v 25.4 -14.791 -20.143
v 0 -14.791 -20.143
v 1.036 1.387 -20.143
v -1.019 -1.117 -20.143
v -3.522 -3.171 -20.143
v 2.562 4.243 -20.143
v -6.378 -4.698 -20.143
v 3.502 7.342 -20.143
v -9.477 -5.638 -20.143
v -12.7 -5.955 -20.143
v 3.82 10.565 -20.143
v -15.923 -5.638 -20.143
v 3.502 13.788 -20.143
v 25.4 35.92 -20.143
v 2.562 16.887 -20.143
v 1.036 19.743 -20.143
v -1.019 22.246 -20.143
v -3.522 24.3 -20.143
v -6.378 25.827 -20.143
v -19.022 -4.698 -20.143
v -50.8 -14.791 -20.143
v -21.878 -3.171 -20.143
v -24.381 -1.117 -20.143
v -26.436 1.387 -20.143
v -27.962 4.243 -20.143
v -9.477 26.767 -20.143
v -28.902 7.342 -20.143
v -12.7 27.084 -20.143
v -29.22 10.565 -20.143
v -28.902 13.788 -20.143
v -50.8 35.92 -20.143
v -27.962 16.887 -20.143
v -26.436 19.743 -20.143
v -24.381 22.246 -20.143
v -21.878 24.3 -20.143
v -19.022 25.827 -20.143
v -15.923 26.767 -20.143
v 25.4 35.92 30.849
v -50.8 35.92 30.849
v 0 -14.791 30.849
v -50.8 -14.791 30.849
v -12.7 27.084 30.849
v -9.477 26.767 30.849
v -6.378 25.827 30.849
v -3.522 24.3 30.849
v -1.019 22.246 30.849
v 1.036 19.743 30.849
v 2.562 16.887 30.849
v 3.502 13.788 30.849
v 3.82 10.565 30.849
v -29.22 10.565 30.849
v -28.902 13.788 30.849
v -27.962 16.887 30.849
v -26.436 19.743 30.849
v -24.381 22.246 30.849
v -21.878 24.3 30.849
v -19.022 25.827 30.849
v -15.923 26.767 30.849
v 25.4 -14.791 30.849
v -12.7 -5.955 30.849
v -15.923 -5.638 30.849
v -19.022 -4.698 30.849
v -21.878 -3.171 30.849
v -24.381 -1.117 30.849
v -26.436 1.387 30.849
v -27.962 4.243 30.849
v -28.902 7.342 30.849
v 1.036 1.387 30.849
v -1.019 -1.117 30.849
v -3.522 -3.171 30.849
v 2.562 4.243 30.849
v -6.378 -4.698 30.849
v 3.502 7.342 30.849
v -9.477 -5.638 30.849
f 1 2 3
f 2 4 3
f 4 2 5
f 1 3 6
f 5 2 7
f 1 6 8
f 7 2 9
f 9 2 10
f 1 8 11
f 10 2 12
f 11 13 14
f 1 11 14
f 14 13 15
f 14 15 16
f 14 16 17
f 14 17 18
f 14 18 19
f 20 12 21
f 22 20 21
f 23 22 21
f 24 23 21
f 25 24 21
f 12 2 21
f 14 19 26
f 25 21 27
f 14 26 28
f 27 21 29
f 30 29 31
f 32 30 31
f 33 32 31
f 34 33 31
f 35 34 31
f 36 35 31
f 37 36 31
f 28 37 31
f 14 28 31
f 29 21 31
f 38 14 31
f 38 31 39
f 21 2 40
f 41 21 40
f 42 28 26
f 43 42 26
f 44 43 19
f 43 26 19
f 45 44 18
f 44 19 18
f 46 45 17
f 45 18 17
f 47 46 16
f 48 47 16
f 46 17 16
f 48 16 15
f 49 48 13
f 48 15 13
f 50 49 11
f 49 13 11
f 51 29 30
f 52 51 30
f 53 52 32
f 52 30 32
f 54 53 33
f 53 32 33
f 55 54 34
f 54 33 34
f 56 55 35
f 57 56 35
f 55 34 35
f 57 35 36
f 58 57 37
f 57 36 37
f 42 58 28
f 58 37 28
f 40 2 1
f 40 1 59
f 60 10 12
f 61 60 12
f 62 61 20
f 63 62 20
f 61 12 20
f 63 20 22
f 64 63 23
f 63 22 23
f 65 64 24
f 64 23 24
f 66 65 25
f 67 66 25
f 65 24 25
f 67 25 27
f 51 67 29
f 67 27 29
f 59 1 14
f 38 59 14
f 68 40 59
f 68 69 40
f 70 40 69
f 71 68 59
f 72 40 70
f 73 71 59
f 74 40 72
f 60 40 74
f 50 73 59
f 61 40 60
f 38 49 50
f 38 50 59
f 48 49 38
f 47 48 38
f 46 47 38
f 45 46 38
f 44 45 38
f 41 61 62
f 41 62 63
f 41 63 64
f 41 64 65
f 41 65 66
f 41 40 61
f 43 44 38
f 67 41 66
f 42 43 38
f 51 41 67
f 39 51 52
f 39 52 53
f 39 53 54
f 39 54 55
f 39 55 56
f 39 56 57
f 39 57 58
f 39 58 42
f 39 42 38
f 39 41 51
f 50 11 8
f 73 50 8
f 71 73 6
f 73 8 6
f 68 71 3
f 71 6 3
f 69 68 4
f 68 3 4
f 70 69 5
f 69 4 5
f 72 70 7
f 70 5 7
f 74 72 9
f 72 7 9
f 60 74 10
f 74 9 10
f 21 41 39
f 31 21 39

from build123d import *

# Parameters (mm, degrees)
F0_W      = 50.710565
F0_H      = 50.99229
F1_DEPTH  = 25.4
F1_FACE_W = 50.710564
F1_FACE_H = 50.99229
F2_DEPTH  = 76.2
F4_DEPTH  = 76.2


with BuildPart() as f1:
    # F0 (on Right) → F1 (new body)
    with BuildSketch(Plane.YZ):
        with Locations((10.5647, 5.352781)):
            Rectangle(F0_W, F0_H)
    extrude(amount=F1_DEPTH)

    # F1_face (on face) → F2 (join)
    with BuildSketch(Plane(origin=(25.4, 10.564701, 5.352781), x_dir=(0, 1, 0), z_dir=(1, 0, 0))):
        Rectangle(F1_FACE_W, F1_FACE_H)
    extrude(amount=-F2_DEPTH)

    # F3 (on face) → F4 (cut)
    with BuildSketch(Plane(origin=(0, 0, -20.143364), x_dir=(1, 0, 0), z_dir=(0, 0, -1))):
        with BuildLine():
            ThreePointArc((3.819773, -10.564701), (-1.018756, 1.116543), (-12.7, 5.955072))
            Line((-12.7, 5.955072), (-12.7, -10.564701))
            Line((-12.7, -10.564701), (3.819773, -10.564701))
        make_face()
        with BuildLine():
            Line((-12.7, -10.564701), (-12.7, 5.955072))
            ThreePointArc((-12.7, 5.955072), (-24.381244, 1.116543), (-29.219773, -10.564701))
            Line((-29.219773, -10.564701), (-12.7, -10.564701))
        make_face()
        with BuildLine():
            Line((3.819773, -10.564701), (-12.7, -10.564701))
            Line((-12.7, -10.564701), (-12.7, -27.084474))
            ThreePointArc((-12.7, -27.084474), (-1.018756, -22.245944), (3.819773, -10.564701))
        make_face()
        with BuildLine():
            Line((-12.7, -27.084474), (-12.7, -10.564701))
            Line((-12.7, -10.564701), (-29.219773, -10.564701))
            ThreePointArc((-29.219773, -10.564701), (-24.381244, -22.245944), (-12.7, -27.084474))
        make_face()
    extrude(amount=-F4_DEPTH, mode=Mode.SUBTRACT)


solid = f1.part
